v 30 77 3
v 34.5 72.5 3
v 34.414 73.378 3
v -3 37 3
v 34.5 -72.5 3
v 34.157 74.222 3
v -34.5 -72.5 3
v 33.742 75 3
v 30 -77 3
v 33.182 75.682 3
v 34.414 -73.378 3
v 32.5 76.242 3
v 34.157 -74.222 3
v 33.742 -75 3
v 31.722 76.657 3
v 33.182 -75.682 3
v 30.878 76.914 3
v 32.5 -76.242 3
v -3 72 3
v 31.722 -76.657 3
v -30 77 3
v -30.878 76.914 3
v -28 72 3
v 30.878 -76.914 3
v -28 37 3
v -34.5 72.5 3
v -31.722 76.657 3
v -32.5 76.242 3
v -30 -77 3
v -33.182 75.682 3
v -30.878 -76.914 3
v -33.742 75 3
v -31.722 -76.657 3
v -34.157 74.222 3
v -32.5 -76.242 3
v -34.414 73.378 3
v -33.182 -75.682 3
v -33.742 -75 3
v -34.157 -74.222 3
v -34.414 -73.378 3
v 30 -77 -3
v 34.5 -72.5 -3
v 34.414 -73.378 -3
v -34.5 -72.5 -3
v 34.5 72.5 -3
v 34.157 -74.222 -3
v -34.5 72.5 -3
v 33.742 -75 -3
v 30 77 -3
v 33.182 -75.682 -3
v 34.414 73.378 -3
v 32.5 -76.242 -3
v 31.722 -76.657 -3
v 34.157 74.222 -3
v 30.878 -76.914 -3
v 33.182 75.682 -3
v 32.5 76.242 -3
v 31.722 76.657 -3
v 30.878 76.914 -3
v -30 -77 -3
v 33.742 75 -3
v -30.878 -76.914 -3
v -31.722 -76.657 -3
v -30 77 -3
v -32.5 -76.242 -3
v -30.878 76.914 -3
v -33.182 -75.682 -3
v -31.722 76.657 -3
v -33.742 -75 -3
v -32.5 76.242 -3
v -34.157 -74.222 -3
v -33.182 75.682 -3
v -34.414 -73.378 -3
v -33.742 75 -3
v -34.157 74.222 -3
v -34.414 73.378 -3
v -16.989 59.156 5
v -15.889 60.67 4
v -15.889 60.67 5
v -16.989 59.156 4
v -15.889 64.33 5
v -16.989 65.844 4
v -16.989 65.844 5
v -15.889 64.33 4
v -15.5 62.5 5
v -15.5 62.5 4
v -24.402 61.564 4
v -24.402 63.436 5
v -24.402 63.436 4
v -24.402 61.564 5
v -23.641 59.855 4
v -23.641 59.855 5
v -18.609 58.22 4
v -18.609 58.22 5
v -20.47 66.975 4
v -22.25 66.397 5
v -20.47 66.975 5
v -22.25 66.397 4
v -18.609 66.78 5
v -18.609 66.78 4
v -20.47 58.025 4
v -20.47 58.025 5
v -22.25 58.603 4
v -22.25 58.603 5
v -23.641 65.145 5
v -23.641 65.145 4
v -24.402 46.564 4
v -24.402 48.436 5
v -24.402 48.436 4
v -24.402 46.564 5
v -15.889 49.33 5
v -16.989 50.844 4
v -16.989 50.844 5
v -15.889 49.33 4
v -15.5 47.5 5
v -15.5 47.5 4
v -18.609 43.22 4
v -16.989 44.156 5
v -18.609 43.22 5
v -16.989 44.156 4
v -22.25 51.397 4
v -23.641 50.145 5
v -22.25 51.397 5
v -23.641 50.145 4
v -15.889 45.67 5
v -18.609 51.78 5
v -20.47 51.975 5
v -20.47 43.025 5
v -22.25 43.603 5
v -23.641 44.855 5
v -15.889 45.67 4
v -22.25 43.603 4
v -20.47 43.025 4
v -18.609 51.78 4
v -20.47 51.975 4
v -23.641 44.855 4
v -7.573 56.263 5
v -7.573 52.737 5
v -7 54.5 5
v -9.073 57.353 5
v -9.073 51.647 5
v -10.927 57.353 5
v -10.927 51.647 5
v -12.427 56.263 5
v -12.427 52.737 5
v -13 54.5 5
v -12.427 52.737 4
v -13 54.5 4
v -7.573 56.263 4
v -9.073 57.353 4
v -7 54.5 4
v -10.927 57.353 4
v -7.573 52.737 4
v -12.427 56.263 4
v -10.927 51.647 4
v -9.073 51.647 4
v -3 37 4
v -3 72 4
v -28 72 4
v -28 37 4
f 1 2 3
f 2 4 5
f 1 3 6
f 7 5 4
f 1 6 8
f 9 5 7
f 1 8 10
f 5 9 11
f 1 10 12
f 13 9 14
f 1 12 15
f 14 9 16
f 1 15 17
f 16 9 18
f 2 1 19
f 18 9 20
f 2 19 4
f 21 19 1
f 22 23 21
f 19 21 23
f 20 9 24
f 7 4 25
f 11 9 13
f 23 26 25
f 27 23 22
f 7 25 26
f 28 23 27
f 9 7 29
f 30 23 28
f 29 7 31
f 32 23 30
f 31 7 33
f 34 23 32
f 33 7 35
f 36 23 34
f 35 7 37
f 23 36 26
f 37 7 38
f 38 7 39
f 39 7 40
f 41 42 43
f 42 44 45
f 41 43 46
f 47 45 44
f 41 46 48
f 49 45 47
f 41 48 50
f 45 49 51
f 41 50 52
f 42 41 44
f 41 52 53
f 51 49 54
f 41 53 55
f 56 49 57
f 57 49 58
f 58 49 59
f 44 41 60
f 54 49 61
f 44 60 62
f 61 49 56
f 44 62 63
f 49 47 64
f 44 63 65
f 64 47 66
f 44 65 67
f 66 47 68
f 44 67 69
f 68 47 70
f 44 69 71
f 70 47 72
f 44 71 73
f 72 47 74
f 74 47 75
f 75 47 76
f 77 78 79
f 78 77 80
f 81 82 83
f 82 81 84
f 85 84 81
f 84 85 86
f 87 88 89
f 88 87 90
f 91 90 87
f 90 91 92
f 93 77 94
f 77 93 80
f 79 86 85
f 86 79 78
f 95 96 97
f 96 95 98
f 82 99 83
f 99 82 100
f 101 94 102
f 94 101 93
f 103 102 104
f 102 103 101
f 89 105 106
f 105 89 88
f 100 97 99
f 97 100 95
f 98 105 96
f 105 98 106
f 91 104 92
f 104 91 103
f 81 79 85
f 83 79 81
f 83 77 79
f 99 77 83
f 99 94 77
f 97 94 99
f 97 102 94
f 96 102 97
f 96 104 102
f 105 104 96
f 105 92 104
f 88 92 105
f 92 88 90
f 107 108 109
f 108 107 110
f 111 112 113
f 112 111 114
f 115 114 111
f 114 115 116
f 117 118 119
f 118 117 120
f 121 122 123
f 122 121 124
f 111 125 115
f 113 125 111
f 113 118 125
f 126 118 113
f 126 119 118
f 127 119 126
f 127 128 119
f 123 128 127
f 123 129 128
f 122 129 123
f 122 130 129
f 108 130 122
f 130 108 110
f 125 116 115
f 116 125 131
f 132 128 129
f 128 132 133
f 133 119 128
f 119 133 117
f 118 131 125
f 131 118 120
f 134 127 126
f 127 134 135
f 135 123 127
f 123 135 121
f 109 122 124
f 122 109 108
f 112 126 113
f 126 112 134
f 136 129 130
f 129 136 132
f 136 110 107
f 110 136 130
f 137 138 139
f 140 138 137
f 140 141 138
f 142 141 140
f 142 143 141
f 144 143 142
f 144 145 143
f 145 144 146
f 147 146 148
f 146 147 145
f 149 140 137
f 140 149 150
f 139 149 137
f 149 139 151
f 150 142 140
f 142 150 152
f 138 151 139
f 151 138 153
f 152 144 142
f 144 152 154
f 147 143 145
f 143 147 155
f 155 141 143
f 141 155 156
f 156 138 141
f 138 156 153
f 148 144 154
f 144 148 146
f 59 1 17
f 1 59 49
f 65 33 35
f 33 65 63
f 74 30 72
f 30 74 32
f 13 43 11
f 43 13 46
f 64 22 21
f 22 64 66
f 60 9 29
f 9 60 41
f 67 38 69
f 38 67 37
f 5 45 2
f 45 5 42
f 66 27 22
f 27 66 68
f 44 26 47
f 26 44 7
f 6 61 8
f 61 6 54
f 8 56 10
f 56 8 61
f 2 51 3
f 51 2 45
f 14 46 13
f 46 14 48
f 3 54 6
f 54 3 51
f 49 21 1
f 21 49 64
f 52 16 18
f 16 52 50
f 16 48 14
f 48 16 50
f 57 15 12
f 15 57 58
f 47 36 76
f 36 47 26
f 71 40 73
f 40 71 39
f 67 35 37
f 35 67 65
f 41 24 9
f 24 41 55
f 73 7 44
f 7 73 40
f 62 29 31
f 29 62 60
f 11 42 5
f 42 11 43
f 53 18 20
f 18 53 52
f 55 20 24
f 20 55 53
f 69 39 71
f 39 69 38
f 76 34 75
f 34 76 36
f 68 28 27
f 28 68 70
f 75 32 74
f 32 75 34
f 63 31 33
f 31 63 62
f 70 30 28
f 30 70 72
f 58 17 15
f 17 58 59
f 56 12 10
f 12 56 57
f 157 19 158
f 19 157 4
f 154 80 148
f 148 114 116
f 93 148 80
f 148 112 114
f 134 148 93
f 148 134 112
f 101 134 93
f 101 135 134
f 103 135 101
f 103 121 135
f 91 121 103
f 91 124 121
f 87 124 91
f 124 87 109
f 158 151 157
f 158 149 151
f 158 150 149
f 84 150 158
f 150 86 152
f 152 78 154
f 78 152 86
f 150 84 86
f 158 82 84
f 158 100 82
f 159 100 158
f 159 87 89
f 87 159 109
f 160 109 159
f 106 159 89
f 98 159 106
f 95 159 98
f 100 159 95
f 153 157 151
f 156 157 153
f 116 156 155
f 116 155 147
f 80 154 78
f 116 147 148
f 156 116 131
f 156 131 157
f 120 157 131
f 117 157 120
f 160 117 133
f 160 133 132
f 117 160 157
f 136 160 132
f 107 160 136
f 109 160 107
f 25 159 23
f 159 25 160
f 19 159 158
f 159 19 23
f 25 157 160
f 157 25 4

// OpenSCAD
echo("Работа Сергея Владыкина");
len_phone = 145;
width_phone = 60;
thickness_phone = 6;

corner_round = 9;

module camera() {
    cube([width_phone, len_phone, thickness_phone], center=true);

    color("blue")
    translate([width_phone/2-50, len_phone/2-10, 0])
    cylinder(d=9, h = thickness_phone - 1);

    color("blue")
    translate([width_phone/2-50, len_phone/2-25, 0])
    cylinder(d=9, h = thickness_phone - 1);

    color("blue")
    translate([width_phone/2-40, len_phone/2-18, 0])
    cylinder(d=6, h = thickness_phone - 1);
}

module smartphone_block() {
    hull() {
        color("red")
        translate([width_phone/2, len_phone/2, 0])
        cylinder(h=thickness_phone, d=corner_round, $fn=32, center=true);

        mirror([1,0,0])
        color("red")
        translate([width_phone/2, len_phone/2, 0])
        cylinder(h=thickness_phone, d=corner_round, $fn=32, center=true);

        mirror([0,1,0])
        color("red")
        translate([width_phone/2, len_phone/2, 0])
        cylinder(h=thickness_phone, d=corner_round, $fn=32, center=true);

        mirror([1,0,0])
        mirror([0,1,0])
        color("red")
        translate([width_phone/2, len_phone/2, 0])
        cylinder(h=thickness_phone, d=corner_round, $fn=32, center=true);
    }
}

h = 3;

module smartphone() {
    smartphone_block();
    camera();
    color("red")
    translate([-28, 37, 2])
    cube([25, 35, 2]);
}

smartphone();
